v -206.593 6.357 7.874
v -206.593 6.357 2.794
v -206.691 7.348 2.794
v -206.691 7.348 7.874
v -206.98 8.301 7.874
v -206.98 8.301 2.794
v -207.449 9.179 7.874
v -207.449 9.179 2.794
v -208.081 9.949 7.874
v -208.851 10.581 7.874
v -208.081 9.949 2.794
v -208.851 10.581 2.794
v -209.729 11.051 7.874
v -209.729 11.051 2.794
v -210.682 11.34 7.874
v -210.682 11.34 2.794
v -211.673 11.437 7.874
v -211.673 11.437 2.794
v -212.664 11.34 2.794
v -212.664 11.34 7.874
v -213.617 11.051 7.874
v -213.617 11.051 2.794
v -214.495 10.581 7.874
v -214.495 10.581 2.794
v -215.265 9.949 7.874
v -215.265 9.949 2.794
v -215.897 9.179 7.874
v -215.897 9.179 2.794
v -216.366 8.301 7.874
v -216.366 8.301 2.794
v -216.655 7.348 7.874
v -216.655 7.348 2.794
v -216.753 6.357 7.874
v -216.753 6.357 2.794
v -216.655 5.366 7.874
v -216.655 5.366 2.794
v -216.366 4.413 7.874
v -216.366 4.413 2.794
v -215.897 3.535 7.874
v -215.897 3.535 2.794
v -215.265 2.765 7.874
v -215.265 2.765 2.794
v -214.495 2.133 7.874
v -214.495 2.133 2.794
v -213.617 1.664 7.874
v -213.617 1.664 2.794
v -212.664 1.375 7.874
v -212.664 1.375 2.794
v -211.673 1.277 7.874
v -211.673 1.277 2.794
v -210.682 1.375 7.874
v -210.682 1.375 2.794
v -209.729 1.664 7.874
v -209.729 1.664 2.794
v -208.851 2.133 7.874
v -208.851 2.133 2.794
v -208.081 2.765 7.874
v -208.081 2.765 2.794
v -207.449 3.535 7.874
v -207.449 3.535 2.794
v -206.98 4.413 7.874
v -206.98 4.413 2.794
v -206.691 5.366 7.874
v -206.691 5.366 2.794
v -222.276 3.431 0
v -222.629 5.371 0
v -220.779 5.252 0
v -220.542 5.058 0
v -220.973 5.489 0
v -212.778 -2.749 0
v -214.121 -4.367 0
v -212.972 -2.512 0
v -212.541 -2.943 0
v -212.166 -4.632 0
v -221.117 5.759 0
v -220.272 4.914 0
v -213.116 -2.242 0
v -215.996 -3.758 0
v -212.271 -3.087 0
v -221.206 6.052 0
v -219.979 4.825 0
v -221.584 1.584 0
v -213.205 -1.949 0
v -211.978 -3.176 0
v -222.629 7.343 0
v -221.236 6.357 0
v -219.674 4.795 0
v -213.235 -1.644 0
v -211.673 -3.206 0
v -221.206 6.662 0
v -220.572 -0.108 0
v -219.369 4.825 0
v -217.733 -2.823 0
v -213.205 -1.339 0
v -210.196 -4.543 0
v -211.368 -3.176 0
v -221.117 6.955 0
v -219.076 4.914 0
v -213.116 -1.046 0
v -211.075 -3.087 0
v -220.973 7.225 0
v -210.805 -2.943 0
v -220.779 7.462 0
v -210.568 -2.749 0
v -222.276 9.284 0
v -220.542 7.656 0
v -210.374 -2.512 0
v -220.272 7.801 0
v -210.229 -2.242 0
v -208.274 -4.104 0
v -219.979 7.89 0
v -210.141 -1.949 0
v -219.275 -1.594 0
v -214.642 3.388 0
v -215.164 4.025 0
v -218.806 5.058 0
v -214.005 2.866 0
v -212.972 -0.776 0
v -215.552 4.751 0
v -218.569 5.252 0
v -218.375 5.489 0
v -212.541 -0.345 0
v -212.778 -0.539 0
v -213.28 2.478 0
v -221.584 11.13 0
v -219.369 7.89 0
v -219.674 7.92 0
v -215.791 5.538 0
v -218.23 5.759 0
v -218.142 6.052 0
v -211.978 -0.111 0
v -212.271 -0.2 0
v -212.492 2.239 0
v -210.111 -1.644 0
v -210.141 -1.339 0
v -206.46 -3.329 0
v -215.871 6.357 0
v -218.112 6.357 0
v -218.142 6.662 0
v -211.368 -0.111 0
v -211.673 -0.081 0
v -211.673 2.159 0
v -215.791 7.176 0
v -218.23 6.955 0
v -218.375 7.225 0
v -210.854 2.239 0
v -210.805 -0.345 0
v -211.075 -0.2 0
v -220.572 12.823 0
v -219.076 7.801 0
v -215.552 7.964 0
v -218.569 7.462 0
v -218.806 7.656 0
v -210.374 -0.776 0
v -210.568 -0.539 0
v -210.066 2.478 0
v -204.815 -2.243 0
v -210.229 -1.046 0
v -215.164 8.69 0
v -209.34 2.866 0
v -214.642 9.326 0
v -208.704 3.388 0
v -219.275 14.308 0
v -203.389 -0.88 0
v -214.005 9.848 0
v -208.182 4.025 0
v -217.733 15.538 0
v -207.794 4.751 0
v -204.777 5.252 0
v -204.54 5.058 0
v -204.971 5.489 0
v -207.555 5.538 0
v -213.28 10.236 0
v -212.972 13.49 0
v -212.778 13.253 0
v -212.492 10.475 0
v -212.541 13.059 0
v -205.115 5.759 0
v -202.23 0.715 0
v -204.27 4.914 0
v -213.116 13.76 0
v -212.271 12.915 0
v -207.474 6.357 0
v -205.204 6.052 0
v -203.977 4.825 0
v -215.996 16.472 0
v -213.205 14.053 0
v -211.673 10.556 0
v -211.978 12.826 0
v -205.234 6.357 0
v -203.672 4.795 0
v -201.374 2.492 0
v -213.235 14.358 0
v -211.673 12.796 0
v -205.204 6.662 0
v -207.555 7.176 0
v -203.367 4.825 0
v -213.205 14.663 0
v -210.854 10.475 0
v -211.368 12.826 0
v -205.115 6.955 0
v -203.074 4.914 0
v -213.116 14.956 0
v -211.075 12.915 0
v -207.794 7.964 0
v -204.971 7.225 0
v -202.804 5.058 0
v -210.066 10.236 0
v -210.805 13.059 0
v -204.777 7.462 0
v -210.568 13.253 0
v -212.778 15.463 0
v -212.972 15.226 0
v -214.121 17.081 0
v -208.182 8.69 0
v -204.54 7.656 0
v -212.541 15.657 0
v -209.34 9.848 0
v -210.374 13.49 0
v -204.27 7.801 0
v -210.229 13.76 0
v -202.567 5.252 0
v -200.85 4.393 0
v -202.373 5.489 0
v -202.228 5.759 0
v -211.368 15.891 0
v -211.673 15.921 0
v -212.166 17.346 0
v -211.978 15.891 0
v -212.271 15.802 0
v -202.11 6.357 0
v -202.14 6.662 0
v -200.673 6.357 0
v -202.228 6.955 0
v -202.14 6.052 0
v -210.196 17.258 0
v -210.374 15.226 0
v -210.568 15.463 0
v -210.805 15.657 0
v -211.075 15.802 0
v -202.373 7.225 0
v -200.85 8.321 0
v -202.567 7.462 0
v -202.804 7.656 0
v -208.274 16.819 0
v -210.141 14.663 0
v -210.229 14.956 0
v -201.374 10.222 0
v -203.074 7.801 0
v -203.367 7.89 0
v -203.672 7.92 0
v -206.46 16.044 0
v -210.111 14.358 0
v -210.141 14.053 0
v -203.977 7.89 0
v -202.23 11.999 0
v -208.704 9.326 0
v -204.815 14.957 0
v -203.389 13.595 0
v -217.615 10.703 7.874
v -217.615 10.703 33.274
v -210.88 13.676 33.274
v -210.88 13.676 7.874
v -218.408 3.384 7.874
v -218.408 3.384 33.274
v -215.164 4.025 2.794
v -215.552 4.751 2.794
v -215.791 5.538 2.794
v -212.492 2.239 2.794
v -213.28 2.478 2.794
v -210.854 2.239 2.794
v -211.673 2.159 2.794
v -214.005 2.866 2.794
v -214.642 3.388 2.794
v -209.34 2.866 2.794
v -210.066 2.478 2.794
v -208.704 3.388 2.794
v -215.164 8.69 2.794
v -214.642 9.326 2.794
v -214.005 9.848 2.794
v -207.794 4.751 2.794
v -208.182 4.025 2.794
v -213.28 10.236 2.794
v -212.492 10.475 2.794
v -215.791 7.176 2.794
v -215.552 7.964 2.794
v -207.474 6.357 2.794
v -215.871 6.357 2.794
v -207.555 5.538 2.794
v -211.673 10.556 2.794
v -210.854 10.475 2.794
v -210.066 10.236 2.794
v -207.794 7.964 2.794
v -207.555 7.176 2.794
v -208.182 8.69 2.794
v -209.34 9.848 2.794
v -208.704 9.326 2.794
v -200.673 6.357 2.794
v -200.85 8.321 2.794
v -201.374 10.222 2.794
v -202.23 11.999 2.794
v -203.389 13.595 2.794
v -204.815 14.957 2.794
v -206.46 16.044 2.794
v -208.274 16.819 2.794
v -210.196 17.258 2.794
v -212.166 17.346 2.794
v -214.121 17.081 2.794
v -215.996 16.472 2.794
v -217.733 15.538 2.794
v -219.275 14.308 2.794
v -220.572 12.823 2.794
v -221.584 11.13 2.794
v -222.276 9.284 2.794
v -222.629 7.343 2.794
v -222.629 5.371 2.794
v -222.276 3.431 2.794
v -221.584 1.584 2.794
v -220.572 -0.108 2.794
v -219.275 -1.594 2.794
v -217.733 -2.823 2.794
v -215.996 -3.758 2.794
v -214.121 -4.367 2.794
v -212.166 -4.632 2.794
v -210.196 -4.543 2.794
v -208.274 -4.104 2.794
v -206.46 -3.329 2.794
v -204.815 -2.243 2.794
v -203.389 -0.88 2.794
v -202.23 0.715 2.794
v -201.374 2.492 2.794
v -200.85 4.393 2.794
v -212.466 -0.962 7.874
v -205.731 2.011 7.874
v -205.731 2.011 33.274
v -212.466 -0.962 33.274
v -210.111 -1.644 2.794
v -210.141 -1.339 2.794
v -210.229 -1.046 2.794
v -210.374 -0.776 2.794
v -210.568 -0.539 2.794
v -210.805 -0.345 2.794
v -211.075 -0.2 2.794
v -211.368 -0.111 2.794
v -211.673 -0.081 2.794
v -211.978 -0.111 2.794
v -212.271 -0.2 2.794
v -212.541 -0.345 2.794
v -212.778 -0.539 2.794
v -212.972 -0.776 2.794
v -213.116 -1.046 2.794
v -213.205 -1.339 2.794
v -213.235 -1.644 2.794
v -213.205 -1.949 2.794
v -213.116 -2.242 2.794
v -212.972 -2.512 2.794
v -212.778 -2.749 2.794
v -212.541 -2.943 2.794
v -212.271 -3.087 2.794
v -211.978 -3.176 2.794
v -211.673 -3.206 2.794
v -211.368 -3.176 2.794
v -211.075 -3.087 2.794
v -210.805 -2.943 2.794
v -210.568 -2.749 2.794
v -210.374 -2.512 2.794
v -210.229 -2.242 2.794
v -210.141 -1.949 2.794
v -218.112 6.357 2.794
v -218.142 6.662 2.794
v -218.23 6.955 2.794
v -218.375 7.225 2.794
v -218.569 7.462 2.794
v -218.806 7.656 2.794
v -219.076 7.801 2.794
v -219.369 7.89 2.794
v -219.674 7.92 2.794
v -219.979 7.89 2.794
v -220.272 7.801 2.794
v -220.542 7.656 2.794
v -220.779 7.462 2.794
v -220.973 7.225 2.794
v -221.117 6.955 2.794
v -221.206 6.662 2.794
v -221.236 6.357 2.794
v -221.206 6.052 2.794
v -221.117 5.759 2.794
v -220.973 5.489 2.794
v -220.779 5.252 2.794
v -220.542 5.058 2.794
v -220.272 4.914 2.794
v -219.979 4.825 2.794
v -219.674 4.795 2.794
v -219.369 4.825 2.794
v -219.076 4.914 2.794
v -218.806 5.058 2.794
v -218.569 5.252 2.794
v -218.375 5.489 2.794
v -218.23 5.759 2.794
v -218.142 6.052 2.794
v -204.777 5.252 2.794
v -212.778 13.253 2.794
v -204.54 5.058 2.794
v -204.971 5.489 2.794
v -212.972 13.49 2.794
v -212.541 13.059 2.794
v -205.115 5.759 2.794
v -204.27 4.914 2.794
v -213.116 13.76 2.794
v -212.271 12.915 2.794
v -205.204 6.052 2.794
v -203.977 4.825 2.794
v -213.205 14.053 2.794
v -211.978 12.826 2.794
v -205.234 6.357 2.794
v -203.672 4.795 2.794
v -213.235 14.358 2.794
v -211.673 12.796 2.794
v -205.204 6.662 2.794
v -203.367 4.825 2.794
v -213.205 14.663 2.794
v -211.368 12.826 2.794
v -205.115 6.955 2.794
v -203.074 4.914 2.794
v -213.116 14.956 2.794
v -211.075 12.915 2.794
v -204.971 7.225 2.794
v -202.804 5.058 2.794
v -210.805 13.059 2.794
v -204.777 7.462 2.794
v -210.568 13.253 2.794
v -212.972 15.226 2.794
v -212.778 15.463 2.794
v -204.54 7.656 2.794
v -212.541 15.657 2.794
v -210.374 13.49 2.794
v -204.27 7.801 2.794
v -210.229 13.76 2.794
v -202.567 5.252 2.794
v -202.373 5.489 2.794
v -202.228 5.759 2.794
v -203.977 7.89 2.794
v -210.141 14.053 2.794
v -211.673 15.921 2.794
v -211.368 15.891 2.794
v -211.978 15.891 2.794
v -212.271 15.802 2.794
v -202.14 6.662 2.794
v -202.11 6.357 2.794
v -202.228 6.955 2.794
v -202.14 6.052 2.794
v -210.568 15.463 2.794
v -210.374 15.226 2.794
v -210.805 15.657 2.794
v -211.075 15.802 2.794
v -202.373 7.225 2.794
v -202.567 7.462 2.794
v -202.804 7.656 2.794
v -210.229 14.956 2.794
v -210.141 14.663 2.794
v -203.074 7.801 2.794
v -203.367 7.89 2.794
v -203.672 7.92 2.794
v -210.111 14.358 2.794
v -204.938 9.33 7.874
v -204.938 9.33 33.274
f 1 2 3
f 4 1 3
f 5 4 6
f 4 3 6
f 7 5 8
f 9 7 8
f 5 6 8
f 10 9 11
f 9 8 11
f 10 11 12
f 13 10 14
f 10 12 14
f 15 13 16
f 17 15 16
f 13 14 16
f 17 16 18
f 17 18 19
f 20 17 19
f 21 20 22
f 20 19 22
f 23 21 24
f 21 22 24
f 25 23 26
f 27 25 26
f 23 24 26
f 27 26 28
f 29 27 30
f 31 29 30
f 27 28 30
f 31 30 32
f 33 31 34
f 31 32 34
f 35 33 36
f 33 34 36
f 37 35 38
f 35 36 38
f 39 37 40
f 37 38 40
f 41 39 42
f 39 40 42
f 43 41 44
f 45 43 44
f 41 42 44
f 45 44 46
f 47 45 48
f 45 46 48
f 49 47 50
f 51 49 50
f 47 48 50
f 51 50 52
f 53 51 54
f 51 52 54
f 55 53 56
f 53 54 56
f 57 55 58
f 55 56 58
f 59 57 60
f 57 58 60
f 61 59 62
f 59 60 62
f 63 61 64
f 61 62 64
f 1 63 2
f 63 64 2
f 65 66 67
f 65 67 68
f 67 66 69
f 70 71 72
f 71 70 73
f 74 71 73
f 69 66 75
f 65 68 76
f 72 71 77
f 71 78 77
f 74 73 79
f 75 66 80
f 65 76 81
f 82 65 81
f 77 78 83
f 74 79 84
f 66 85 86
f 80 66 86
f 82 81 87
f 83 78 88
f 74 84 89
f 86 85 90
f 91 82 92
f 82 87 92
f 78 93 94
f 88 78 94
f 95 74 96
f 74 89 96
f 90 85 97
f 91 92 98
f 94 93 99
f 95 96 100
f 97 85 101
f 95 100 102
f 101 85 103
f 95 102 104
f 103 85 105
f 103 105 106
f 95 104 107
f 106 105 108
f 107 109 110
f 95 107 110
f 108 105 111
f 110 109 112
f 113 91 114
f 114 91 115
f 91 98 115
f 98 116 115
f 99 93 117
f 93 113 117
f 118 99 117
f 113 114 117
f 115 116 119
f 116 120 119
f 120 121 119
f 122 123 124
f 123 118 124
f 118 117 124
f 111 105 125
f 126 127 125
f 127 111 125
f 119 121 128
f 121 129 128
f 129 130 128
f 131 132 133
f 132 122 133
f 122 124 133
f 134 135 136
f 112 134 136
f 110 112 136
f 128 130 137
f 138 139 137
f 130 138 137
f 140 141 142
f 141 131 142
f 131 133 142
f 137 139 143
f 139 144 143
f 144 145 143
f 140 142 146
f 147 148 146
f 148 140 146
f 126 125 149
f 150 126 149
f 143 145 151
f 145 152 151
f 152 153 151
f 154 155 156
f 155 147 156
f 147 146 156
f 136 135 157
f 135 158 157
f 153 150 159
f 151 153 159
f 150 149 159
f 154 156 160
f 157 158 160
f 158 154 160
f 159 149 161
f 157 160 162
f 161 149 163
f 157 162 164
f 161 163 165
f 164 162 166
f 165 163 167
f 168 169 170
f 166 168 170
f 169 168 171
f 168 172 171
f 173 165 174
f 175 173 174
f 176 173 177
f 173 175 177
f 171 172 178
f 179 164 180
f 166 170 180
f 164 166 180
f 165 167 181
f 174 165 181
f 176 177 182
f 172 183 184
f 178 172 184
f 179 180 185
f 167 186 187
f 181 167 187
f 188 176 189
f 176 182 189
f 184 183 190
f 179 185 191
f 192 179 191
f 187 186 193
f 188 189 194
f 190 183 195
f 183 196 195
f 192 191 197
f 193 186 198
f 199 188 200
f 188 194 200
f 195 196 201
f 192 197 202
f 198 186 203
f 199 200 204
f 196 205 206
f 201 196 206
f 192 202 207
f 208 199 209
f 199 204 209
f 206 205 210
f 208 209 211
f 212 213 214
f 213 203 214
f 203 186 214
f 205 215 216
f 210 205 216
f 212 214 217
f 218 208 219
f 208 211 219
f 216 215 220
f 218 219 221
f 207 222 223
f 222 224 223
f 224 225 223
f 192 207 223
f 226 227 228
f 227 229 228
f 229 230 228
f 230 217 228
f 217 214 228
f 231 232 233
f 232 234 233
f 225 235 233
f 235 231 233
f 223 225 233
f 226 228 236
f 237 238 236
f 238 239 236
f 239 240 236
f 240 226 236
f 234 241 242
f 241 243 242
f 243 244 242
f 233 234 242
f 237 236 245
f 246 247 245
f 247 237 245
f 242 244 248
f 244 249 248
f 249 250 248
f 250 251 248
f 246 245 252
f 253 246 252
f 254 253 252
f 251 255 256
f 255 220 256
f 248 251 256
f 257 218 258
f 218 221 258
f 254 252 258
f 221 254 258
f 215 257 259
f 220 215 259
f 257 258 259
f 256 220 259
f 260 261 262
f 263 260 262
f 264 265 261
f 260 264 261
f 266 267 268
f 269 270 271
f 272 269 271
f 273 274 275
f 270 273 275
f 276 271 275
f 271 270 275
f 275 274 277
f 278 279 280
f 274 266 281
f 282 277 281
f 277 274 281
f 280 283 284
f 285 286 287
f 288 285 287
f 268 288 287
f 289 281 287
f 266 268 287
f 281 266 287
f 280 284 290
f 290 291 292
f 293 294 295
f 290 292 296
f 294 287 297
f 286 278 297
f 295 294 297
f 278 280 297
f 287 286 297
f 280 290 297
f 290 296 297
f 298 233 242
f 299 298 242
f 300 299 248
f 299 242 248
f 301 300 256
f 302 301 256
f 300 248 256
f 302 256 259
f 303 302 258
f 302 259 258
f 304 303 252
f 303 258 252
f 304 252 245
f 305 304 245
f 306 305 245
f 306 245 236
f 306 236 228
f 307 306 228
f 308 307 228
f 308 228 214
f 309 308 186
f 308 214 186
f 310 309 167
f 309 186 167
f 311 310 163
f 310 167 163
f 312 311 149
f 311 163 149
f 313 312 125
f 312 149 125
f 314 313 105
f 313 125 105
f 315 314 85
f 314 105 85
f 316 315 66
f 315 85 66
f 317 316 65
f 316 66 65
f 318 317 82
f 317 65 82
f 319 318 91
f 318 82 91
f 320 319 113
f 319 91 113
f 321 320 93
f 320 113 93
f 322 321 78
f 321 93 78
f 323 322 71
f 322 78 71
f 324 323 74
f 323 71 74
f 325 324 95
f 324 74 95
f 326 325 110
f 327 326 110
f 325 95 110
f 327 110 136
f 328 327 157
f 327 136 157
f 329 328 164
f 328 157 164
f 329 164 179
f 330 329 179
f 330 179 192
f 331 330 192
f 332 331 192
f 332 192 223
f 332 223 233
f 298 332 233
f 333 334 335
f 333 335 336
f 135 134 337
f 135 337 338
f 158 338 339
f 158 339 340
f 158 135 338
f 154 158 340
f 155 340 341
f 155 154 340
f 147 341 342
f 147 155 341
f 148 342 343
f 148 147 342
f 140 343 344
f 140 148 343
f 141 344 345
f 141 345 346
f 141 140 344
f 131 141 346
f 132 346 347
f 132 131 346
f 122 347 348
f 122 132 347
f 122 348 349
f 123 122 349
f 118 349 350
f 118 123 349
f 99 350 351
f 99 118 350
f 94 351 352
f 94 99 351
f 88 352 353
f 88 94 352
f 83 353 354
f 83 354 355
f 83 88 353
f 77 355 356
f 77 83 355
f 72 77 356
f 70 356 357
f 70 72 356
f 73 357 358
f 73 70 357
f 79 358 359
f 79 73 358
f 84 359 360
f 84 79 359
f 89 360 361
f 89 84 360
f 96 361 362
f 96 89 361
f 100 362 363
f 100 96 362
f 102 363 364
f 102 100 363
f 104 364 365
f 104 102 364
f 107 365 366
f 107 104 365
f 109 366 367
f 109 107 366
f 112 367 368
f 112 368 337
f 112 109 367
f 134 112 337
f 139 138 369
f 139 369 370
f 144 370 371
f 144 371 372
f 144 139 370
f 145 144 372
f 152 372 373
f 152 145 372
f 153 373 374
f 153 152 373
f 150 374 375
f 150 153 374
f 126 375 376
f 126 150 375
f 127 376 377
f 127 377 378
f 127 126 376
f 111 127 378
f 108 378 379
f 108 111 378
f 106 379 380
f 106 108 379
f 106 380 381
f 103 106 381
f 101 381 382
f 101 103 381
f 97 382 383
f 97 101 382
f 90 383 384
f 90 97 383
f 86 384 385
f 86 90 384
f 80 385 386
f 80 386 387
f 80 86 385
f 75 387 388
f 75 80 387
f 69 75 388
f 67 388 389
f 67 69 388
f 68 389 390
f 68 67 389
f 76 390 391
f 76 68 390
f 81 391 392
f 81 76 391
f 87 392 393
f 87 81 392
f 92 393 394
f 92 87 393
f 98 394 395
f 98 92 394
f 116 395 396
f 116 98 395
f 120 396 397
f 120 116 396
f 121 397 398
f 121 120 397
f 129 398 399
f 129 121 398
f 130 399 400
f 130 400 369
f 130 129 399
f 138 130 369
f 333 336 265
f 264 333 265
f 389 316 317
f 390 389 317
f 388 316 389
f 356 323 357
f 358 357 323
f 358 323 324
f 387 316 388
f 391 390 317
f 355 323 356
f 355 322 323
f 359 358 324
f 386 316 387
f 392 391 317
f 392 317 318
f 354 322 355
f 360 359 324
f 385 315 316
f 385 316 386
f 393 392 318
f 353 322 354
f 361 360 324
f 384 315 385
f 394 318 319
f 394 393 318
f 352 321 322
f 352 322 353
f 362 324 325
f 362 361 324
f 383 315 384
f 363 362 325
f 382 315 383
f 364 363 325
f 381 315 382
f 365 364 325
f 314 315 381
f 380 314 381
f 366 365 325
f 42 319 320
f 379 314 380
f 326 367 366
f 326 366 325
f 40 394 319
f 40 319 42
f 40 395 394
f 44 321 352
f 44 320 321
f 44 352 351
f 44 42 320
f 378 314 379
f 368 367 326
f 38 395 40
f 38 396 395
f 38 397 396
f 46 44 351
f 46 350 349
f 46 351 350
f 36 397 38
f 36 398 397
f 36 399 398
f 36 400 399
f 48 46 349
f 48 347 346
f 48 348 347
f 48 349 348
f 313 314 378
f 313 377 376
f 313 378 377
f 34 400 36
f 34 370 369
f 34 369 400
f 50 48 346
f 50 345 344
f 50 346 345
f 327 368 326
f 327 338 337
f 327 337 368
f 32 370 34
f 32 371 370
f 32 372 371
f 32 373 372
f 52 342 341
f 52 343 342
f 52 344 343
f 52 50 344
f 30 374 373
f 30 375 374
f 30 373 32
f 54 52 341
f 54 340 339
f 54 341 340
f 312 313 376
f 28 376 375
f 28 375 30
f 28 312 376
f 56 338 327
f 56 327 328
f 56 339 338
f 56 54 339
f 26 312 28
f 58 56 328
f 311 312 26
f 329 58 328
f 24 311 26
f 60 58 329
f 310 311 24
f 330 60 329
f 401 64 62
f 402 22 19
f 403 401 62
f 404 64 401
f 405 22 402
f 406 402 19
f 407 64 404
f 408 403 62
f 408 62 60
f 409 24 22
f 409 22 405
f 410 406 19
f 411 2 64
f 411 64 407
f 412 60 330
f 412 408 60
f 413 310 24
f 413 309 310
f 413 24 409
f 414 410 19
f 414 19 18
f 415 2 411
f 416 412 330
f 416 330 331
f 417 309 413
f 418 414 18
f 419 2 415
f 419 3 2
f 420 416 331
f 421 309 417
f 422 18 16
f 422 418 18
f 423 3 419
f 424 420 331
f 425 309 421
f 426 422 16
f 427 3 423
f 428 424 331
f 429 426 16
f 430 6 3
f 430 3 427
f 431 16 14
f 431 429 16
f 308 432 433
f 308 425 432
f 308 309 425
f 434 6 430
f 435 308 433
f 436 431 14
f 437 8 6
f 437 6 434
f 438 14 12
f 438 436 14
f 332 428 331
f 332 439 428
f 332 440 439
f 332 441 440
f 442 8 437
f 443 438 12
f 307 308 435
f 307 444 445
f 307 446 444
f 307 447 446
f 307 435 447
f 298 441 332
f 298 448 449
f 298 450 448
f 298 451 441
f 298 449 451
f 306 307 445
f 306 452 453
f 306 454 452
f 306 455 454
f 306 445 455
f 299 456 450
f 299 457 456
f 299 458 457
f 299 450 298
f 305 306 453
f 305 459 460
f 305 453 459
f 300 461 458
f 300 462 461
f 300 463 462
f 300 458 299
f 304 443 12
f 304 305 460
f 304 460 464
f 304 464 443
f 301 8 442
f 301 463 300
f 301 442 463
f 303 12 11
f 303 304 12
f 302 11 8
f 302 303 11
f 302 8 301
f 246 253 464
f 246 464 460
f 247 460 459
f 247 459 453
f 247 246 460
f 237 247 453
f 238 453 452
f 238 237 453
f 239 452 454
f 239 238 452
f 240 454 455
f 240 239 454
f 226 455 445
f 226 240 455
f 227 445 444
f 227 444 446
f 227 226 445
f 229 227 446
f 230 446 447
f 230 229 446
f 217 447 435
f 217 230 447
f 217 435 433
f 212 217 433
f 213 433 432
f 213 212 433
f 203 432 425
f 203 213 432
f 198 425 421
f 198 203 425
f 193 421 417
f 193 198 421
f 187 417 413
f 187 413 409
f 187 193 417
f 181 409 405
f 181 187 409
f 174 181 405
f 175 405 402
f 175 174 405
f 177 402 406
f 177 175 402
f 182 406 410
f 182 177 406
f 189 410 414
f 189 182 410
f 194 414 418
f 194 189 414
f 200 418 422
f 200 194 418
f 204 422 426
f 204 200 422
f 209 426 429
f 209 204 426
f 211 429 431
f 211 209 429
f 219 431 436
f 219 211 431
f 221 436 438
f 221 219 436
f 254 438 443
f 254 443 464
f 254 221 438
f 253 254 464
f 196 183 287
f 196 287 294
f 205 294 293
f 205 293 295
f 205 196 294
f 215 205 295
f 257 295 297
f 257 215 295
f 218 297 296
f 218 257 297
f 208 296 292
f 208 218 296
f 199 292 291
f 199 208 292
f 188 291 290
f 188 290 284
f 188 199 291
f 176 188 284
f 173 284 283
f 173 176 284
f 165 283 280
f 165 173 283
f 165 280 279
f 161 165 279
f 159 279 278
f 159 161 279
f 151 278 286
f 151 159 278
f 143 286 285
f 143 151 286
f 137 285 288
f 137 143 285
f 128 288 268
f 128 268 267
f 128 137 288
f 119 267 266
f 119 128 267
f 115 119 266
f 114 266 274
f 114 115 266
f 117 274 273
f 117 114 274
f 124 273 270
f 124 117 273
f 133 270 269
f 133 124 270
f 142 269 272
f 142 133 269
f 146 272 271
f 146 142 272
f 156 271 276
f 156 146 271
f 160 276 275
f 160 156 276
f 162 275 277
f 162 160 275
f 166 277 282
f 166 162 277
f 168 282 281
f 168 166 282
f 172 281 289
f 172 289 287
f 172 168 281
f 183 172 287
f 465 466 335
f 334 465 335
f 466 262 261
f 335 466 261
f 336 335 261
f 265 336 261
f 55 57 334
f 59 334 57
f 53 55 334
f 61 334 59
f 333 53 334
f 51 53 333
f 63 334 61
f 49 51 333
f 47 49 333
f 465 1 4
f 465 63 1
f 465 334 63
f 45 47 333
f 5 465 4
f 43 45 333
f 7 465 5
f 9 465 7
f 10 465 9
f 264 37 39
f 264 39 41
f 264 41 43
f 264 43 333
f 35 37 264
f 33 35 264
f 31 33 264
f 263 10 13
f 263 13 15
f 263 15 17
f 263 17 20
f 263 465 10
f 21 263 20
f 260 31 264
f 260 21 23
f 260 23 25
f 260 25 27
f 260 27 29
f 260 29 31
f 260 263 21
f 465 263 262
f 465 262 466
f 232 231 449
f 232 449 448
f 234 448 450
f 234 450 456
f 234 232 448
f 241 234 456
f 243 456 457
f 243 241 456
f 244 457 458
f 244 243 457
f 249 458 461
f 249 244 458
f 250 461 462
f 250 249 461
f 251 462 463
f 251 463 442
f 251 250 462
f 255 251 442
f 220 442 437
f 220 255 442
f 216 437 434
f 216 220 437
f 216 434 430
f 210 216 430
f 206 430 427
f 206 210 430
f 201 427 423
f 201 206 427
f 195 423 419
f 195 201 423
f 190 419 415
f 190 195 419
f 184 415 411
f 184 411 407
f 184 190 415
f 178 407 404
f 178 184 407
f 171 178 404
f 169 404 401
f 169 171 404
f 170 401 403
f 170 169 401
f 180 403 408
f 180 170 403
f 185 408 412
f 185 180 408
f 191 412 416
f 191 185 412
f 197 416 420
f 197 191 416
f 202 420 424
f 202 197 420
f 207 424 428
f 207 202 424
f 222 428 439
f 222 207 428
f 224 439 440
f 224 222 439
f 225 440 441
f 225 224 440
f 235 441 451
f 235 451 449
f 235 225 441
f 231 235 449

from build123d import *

# Parameters (mm, degrees)
SKETCH1_R           = 11.000000098
SKETCH1_R_2         = 4.1984422
SKETCH1_R_3         = 1.56235781
BOSS_EXTRUDE1_DEPTH = 2.794
SKETCH4_R           = 5.08
BOSS_EXTRUDE2_DEPTH = 5.08
BOSS_EXTRUDE4_DEPTH = 25.4


with BuildPart() as part:
    # Sketch1 → Boss-Extrude1 (new body)
    with BuildSketch(Plane.XY):
        with Locations((-211.672901702, 6.35719782)):
            Circle(SKETCH1_R)
        with Locations((-211.672901702, 6.35719782)):
            Circle(SKETCH1_R_2, mode=Mode.SUBTRACT)
        with Locations((-211.672901702, 14.35819782)):
            Circle(SKETCH1_R_3, mode=Mode.SUBTRACT)
        with Locations((-219.673901702, 6.35719782)):
            Circle(SKETCH1_R_3, mode=Mode.SUBTRACT)
        with Locations((-211.672901702, -1.64380218)):
            Circle(SKETCH1_R_3, mode=Mode.SUBTRACT)
        with Locations((-203.671901702, 6.35719782)):
            Circle(SKETCH1_R_3, mode=Mode.SUBTRACT)
    extrude(amount=BOSS_EXTRUDE1_DEPTH)

    # Sketch4 → Boss-Extrude2 (add)
    with BuildSketch(Plane.XY.offset(2.794)):
        with Locations((-211.672901702, 6.35719782)):
            Circle(SKETCH4_R)
    extrude(amount=BOSS_EXTRUDE2_DEPTH)

    # Sketch6 → Boss-Extrude4 (add)
    with BuildSketch(Plane.XY.offset(7.874)):
        Polygon((-217.614895912, 10.703116021), (-210.880223241, 13.676074856), (-204.938229031, 9.330156654), (-205.730907491, 2.011279618), (-212.465580162, -0.961679217), (-218.407574373, 3.384238985), align=None)
    extrude(amount=BOSS_EXTRUDE4_DEPTH)


solid = part.part
